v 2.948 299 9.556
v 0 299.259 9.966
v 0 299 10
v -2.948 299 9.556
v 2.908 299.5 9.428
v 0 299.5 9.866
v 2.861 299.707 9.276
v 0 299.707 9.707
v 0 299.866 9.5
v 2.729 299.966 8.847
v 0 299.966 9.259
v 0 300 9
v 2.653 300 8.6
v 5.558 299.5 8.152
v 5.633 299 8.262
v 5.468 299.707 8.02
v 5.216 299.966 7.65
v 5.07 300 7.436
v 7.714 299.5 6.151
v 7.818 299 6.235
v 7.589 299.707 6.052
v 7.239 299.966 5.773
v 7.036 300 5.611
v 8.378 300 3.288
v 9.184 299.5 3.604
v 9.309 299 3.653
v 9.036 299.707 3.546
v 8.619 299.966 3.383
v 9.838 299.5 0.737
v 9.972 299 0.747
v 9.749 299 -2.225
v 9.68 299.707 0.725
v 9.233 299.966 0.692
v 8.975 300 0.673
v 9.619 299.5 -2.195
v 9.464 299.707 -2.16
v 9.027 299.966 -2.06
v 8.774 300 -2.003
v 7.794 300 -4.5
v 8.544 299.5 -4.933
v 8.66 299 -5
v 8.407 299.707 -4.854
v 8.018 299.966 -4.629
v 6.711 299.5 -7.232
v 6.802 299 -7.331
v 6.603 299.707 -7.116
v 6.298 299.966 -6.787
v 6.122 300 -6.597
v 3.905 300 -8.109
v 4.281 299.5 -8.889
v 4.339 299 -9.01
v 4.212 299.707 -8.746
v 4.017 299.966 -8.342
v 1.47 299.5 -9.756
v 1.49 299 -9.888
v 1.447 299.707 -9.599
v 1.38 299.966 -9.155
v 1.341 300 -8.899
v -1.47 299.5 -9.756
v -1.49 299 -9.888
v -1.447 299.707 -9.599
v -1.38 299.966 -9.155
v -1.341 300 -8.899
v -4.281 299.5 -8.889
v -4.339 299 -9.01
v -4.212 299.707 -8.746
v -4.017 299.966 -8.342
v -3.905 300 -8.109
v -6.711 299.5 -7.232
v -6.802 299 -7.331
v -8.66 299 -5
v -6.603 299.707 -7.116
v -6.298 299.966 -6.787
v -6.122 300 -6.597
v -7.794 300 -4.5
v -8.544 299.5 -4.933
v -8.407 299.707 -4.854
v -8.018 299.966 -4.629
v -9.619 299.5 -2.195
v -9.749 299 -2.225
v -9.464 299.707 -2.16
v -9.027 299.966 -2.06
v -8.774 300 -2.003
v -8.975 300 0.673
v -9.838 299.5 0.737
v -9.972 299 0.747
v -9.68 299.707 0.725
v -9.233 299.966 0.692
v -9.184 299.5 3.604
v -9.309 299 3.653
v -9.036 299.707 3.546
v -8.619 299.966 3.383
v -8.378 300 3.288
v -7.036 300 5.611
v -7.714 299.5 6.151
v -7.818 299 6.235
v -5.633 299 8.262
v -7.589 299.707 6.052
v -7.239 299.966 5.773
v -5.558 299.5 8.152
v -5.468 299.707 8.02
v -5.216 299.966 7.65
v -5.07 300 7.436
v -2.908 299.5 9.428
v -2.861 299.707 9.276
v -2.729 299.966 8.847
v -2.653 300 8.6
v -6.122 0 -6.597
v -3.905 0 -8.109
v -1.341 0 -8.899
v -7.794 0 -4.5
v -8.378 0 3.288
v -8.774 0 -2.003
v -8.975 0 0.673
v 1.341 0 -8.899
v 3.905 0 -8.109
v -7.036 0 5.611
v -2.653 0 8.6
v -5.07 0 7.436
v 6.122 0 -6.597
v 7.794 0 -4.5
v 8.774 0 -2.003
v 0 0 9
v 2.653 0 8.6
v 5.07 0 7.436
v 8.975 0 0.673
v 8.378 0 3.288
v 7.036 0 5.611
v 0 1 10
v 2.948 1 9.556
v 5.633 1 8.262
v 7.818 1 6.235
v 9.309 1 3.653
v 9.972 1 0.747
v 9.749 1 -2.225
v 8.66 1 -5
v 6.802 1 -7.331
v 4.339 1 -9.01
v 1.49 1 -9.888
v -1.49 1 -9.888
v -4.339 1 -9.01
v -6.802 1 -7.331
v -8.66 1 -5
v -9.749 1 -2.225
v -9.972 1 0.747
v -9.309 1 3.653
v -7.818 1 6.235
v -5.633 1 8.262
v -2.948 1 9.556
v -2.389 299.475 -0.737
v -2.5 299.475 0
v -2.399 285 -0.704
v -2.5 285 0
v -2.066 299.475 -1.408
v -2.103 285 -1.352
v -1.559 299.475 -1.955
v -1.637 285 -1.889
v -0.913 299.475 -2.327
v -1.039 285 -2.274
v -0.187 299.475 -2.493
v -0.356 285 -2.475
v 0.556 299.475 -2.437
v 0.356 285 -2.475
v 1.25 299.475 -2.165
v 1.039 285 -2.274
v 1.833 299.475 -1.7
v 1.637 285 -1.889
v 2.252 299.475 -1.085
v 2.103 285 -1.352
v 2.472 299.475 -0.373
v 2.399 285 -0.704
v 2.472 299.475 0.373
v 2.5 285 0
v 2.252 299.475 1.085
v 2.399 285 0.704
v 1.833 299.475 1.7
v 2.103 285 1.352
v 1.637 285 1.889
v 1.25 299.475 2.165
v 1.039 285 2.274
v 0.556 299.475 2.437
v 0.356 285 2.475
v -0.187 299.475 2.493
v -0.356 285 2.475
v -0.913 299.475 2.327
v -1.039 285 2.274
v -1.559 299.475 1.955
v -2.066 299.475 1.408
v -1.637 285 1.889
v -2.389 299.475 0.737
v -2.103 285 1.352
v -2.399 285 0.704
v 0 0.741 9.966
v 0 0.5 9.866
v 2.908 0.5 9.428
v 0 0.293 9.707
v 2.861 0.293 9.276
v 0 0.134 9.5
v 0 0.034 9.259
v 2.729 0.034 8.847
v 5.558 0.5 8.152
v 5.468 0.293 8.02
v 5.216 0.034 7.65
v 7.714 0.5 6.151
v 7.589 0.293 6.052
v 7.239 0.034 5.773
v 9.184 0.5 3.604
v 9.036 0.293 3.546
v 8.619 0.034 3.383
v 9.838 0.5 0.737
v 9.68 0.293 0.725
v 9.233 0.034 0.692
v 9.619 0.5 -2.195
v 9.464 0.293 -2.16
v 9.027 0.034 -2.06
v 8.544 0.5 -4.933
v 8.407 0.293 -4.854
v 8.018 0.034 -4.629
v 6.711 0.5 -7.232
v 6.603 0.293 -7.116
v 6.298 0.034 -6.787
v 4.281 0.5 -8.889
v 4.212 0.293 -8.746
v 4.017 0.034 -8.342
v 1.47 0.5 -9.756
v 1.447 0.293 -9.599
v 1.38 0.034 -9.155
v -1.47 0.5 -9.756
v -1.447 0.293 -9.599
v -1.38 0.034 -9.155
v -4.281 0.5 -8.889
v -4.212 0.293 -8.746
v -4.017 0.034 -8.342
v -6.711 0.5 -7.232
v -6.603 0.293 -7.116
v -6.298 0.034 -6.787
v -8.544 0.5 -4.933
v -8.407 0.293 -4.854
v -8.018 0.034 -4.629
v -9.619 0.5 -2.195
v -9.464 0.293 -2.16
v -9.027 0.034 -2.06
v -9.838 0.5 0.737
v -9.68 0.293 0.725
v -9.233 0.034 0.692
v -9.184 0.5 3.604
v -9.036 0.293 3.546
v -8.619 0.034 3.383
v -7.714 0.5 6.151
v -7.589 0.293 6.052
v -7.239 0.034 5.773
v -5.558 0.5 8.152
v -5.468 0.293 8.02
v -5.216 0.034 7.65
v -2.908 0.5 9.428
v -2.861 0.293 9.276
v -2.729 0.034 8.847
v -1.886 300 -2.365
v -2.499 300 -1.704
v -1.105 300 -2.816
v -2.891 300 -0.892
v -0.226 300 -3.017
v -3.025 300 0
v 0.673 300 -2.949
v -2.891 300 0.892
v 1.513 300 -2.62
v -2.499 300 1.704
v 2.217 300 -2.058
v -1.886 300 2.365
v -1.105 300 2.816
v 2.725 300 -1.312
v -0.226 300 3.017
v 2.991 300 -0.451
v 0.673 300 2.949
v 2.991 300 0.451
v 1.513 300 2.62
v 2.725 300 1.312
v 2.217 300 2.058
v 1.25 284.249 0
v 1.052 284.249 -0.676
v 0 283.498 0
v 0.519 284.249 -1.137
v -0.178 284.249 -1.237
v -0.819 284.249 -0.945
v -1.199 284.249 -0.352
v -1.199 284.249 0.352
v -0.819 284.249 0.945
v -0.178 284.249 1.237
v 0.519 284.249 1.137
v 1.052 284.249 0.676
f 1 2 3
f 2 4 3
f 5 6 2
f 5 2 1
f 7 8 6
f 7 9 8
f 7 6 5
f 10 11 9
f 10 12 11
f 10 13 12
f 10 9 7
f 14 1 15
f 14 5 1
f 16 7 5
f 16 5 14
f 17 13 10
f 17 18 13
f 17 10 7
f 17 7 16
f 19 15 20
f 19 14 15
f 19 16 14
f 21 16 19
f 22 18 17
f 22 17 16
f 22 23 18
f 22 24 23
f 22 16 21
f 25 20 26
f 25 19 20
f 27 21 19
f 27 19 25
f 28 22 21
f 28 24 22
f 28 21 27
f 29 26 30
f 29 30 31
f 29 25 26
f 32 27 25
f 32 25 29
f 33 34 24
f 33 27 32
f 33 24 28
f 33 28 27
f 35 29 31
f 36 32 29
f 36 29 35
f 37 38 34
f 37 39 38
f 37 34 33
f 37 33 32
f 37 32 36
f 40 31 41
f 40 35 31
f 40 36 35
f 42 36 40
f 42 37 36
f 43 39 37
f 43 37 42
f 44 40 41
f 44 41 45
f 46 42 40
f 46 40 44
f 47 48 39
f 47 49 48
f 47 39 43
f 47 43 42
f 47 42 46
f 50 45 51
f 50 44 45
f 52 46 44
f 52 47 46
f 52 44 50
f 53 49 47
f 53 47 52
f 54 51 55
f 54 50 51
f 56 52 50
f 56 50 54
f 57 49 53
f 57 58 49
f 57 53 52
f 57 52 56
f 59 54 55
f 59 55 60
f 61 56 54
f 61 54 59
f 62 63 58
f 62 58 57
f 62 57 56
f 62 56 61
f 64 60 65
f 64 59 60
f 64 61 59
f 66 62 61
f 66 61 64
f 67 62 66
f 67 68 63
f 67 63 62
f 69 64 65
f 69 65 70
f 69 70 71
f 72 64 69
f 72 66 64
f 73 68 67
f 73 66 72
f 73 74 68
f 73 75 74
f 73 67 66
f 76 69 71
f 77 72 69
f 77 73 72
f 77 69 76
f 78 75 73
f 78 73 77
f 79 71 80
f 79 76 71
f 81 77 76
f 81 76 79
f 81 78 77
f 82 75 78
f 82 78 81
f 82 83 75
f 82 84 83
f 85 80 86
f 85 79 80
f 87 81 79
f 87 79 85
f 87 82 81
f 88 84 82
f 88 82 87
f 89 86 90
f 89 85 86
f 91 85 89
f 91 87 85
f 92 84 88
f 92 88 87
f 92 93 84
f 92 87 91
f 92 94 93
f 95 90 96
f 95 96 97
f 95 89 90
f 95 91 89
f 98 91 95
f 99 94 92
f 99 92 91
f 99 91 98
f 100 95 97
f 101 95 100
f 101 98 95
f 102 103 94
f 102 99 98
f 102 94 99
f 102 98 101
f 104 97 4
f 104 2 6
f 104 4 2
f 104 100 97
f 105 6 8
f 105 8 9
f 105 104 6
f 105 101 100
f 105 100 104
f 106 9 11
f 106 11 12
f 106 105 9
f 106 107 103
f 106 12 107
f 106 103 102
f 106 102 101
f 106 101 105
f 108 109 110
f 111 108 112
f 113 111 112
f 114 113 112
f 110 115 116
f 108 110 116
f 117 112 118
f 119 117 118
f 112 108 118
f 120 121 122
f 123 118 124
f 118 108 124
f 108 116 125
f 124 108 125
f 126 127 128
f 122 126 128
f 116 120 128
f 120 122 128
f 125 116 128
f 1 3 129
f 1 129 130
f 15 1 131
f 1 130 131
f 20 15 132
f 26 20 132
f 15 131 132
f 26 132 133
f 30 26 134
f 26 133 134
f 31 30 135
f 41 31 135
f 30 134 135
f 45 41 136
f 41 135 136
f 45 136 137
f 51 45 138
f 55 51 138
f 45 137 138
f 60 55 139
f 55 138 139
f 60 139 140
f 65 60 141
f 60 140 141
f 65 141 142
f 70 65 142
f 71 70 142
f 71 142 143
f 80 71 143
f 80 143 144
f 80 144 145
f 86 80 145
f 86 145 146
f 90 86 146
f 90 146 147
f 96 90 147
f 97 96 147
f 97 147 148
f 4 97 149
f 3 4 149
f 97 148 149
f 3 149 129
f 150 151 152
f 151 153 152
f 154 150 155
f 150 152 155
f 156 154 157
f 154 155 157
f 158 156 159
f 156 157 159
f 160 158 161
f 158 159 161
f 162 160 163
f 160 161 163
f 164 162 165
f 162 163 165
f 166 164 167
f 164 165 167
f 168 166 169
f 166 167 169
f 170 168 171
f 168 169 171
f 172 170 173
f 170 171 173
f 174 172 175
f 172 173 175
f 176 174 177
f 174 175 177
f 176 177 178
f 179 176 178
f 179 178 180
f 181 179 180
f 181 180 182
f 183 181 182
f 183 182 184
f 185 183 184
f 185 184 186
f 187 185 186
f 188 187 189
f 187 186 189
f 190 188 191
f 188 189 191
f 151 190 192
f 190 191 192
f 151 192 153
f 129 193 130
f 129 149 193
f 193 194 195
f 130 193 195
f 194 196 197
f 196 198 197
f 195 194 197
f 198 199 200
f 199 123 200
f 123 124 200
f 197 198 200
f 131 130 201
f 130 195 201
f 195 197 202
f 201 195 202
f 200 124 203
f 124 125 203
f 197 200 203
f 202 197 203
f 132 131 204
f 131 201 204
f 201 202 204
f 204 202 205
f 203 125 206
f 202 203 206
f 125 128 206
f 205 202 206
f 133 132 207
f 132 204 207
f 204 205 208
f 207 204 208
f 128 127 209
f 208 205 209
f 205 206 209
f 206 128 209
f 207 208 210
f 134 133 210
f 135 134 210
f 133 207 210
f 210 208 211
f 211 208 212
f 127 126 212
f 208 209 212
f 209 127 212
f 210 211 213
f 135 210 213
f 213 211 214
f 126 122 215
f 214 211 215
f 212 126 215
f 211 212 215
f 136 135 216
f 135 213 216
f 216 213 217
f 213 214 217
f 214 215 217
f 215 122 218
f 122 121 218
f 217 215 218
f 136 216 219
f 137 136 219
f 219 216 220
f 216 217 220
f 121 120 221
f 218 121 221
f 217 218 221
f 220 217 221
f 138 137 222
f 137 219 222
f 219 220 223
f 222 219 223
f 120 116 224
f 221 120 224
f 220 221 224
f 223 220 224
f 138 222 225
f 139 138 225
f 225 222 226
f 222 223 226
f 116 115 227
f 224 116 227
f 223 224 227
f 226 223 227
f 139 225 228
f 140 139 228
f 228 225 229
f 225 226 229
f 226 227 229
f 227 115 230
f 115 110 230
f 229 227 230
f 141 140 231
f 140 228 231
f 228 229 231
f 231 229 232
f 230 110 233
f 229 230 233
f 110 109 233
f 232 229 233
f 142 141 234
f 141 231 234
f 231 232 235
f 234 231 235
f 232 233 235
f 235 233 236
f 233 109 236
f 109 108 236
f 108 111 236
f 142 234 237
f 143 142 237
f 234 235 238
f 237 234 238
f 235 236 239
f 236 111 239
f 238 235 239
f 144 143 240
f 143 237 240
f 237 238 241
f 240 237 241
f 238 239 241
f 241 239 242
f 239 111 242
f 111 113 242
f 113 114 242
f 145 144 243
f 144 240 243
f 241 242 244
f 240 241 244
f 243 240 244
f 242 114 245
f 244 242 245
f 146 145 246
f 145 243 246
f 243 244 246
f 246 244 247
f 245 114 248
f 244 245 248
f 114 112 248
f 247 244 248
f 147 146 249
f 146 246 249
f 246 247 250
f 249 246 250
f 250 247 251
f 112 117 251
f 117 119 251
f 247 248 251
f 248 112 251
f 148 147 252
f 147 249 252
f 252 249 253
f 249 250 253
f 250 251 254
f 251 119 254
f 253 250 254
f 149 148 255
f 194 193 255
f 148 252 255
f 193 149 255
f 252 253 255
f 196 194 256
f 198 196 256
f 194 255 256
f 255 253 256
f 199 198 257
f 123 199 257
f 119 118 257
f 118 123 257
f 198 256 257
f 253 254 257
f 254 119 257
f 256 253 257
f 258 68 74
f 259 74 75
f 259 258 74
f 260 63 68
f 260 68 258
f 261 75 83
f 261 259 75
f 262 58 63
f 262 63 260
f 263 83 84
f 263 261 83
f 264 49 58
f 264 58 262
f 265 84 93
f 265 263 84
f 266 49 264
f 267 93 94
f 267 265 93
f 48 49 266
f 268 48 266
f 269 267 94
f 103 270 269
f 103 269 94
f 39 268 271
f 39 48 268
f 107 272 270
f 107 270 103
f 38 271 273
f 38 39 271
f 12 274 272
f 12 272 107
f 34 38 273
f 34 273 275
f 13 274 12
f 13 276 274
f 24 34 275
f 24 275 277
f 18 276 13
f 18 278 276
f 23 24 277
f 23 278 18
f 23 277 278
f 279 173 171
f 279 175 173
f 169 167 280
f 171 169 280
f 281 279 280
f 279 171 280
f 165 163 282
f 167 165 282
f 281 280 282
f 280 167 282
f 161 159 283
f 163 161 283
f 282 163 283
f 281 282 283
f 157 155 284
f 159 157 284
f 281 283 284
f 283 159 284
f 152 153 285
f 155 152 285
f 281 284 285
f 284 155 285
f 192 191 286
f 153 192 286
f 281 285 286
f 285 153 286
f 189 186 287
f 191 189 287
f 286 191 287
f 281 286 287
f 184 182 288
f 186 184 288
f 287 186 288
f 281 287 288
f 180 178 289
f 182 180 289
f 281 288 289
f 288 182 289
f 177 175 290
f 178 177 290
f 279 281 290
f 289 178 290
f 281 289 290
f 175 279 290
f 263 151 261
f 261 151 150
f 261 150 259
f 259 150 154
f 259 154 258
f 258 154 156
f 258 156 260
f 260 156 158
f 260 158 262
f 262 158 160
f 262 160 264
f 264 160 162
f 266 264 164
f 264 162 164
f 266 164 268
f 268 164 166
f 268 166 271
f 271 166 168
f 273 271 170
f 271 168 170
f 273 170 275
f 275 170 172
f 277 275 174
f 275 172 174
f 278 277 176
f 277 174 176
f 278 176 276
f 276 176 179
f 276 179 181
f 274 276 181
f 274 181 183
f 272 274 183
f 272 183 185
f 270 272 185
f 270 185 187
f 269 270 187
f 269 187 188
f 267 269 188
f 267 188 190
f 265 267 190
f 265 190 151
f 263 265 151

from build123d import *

# Parameters (mm, degrees)
SKETCH_1_R           = 10
EXTRUDE_1_DEPTH      = 300
M6X1_0_2_D           = 5
M6X1_0_2_DEPTH       = 15
M6X1_0_2_CSINK_D     = 6.05
M6X1_0_2_CSINK_ANGLE = 90
M6X1_0_2_TIP         = 1.502151548
FILLET_1_R           = 1
FILLET_2_R           = 1


with BuildPart() as part:
    # 草图1 → 凸台-拉伸1 (new body)
    with BuildSketch(Plane(origin=(0, 0, 0), x_dir=(1, 0, 0), z_dir=(0, 1, 0))):
        with Locations(Location((0, 0, 0), (0, 0, 270))):
            Circle(SKETCH_1_R)
    extrude(amount=EXTRUDE_1_DEPTH)

    # M6x1.0 螺纹孔2
    with Locations(Plane(origin=(0, 300, 0), x_dir=(1, 0, 0), z_dir=(0, 1, 0))):
        with Locations((0, 0)):
            CounterSinkHole(M6X1_0_2_D / 2, M6X1_0_2_CSINK_D / 2, depth=M6X1_0_2_DEPTH, counter_sink_angle=M6X1_0_2_CSINK_ANGLE)
            with Locations((0, 0, -(M6X1_0_2_DEPTH + M6X1_0_2_TIP / 2))):  # 118° drill point
                Cone(0, M6X1_0_2_D / 2, M6X1_0_2_TIP, mode=Mode.SUBTRACT)

    # 圆角1
    fillet_1_edges = [part.edges().sort_by_distance(p)[0] for p in [
        (0, 300, -10),
    ]]
    fillet(fillet_1_edges, radius=FILLET_1_R)

    # 圆角2
    fillet_2_edges = [part.edges().sort_by_distance(p)[0] for p in [
        (0, 0, -10),
    ]]
    fillet(fillet_2_edges, radius=FILLET_2_R)


solid = part.part
